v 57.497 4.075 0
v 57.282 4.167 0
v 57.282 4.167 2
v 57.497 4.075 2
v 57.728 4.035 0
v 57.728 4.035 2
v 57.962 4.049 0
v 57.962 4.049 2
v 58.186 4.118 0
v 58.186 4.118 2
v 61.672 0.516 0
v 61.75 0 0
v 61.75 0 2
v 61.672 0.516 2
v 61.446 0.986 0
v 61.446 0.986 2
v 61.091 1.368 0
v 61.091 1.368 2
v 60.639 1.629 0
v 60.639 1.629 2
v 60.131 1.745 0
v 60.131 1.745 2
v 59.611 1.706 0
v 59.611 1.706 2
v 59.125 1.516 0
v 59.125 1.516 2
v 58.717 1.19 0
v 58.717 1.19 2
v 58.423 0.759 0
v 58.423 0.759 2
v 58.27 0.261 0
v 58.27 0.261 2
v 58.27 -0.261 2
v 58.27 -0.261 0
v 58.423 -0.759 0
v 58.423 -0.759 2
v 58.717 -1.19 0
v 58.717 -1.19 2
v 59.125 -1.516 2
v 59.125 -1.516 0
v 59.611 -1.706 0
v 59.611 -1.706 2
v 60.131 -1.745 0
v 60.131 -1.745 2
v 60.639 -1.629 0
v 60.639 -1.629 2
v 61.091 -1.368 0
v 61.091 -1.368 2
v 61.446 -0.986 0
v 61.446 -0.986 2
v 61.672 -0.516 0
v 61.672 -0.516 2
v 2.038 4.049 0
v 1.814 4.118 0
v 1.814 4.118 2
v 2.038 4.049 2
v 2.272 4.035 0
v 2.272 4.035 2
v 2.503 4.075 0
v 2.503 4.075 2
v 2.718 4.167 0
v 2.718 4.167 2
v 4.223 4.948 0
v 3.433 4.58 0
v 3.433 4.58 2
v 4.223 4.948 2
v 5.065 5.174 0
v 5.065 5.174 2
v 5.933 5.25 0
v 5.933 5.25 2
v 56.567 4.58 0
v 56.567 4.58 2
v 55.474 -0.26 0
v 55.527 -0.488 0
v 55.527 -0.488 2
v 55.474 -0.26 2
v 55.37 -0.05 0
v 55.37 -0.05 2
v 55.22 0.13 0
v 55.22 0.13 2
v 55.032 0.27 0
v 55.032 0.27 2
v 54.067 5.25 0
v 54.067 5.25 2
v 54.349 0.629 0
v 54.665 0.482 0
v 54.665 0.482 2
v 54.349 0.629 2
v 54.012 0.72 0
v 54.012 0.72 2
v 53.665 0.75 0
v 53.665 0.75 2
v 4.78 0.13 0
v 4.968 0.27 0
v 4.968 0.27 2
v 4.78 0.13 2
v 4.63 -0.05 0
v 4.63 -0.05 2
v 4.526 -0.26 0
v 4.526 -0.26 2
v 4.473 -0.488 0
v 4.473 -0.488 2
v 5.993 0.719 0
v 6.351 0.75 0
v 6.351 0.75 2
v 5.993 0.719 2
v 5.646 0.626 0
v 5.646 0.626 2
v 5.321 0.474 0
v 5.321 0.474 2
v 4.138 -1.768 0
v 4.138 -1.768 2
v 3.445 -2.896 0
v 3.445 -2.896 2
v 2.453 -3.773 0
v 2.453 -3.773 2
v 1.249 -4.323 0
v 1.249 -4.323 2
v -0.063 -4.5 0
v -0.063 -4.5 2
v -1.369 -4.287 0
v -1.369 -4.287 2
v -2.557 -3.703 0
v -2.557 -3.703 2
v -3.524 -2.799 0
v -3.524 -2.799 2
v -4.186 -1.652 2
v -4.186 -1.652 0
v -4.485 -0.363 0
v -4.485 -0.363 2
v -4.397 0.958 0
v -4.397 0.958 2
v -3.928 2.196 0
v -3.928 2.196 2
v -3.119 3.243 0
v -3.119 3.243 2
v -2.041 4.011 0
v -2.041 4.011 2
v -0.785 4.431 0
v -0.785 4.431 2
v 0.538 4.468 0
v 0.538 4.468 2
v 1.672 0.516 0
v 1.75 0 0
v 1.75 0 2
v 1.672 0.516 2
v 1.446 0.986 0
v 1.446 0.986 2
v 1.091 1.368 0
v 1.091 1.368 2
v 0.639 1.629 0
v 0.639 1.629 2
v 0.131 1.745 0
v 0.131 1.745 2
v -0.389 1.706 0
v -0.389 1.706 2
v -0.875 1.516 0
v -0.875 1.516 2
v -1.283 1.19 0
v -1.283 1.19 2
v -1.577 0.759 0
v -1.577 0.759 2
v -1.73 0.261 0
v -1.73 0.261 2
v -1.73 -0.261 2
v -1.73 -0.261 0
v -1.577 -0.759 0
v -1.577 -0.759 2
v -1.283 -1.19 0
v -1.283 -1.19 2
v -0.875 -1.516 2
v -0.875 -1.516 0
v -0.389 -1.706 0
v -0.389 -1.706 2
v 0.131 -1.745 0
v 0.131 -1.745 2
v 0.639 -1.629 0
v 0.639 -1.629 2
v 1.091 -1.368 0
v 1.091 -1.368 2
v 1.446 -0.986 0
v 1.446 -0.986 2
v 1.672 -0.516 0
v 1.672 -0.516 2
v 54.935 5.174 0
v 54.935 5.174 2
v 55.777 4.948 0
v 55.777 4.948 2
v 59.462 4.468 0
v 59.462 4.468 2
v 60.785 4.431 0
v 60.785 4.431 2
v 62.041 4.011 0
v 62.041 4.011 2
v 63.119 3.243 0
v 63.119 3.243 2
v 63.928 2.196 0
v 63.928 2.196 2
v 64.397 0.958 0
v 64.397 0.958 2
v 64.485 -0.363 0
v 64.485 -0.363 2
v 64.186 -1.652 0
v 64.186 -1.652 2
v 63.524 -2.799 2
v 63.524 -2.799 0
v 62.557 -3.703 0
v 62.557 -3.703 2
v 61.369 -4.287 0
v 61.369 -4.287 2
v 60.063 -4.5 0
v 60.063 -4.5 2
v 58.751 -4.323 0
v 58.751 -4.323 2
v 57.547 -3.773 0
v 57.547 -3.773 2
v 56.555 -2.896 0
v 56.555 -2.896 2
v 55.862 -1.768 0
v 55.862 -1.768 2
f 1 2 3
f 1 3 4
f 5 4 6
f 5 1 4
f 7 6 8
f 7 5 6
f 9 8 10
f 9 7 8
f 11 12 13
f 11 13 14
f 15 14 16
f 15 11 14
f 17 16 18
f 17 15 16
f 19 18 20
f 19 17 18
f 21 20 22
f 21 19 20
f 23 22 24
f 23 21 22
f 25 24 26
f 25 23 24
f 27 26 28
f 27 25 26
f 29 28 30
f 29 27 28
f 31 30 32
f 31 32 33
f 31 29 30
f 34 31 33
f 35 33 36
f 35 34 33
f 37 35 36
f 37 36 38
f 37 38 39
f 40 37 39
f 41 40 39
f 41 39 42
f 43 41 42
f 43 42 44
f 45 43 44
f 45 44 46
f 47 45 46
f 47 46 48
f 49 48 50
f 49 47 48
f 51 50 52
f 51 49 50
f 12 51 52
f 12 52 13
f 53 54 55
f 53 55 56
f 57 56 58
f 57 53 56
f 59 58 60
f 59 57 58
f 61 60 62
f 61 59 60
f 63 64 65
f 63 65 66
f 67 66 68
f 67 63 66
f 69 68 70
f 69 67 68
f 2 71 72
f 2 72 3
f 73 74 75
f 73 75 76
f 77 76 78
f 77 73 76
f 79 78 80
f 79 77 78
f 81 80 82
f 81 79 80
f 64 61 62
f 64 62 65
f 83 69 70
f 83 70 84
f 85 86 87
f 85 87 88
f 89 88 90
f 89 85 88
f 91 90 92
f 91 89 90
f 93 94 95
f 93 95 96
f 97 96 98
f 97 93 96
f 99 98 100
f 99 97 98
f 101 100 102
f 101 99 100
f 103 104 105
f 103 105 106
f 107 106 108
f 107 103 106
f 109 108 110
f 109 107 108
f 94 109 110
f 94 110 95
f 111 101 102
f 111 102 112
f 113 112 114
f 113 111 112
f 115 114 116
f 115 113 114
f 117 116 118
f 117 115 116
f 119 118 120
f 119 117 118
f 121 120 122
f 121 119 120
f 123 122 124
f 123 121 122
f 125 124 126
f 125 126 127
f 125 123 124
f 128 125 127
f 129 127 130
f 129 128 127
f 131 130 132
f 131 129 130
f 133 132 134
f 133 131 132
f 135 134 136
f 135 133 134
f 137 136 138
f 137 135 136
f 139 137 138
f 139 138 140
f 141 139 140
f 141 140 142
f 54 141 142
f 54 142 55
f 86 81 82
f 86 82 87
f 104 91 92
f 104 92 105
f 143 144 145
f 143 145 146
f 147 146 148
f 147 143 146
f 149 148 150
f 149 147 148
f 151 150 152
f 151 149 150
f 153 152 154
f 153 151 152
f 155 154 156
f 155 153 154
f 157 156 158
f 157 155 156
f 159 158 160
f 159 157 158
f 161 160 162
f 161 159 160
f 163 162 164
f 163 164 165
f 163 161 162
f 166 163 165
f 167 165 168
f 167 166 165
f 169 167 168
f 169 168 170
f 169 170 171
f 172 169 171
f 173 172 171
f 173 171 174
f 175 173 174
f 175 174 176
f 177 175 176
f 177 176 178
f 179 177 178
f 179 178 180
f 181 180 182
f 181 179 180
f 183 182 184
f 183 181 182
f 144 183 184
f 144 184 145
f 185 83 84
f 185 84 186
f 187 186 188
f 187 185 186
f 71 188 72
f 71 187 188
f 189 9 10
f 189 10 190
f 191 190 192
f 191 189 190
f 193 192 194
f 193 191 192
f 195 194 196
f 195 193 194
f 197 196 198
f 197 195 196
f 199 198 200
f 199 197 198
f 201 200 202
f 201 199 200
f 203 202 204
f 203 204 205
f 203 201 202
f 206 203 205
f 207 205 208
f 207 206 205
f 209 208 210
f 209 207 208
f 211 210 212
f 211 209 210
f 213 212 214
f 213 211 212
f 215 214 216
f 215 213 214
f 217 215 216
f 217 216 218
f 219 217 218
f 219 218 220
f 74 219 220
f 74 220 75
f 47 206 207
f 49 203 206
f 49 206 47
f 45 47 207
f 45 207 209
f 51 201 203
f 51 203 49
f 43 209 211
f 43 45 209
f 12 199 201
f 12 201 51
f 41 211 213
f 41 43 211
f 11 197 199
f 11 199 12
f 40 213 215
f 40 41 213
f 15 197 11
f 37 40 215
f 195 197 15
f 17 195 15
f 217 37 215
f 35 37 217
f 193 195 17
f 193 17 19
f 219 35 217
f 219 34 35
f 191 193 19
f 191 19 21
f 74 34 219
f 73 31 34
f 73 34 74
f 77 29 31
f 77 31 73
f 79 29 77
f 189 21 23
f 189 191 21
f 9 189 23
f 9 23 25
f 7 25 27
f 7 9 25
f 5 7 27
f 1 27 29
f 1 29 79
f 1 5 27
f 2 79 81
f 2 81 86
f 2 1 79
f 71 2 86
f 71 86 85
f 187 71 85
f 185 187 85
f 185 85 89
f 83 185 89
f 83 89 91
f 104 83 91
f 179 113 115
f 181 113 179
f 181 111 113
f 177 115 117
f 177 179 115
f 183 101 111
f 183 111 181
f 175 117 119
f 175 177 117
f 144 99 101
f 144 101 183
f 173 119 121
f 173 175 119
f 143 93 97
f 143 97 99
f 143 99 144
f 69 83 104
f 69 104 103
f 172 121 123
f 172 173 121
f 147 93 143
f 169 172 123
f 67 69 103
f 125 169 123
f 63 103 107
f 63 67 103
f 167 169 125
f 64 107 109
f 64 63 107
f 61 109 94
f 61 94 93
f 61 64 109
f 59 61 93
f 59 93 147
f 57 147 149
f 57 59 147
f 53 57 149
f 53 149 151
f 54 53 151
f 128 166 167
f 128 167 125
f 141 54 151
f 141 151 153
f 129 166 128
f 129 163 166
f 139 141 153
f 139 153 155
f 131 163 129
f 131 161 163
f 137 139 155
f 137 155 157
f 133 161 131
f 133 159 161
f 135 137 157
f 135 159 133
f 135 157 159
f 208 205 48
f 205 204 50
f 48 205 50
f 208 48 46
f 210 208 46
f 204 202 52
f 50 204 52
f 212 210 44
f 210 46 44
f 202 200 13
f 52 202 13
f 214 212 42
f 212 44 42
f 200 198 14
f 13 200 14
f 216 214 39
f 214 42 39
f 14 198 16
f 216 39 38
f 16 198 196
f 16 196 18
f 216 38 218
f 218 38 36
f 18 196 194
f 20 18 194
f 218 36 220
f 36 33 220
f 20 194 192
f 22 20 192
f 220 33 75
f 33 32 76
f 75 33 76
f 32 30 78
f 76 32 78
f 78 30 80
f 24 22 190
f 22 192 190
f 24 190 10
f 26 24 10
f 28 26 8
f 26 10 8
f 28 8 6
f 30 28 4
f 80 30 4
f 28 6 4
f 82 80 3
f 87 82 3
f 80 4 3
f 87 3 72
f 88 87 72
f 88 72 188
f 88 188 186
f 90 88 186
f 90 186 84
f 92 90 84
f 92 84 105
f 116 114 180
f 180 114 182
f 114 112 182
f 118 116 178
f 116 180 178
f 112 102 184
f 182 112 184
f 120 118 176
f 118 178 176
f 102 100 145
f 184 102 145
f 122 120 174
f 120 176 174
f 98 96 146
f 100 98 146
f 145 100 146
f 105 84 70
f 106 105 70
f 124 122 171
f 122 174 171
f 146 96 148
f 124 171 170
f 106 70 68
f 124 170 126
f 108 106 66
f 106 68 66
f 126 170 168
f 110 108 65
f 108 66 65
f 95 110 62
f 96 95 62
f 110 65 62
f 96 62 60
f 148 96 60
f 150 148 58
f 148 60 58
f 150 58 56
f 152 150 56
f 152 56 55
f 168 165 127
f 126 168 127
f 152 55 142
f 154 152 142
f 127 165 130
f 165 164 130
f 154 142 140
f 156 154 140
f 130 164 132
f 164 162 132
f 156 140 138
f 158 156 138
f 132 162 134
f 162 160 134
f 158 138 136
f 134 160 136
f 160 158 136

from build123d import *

# Parameters (mm, degrees)
SKETCH1_R           = 1.75
BOSS_EXTRUDE1_DEPTH = 2


with BuildPart() as part:
    # Sketch1 → Boss-Extrude1 (new body)
    with BuildSketch(Plane.XY):
        with BuildLine():
            Line((2.717606537, 4.167087077), (3.433012702, 4.580127019))
            ThreePointArc((3.433012702, 4.580127019), (4.638917476, 5.079629131), (5.933012702, 5.25))
            Line((5.933012702, 5.25), (54.066987298, 5.25))
            ThreePointArc((54.066987298, 5.25), (55.361082524, 5.079629131), (56.566987298, 4.580127019))
            Line((56.566987298, 4.580127019), (57.282393463, 4.167087077))
            ThreePointArc((57.282393463, 4.167087077), (57.728126896, 4.034585997), (58.185594651, 4.118001121))
            ThreePointArc((58.185594651, 4.118001121), (63.897114317, -2.25), (55.526503742, -0.487679436))
            ThreePointArc((55.526503742, -0.487679436), (55.370009481, -0.049793176), (55.032393463, 0.26997276))
            Line((55.032393463, 0.26997276), (54.665063509, 0.482050808))
            ThreePointArc((54.665063509, 0.482050808), (54.1827016, 0.681851653), (53.665063509, 0.75))
            Line((53.665063509, 0.75), (6.350969201, 0.75))
            ThreePointArc((6.350969201, 0.75), (5.817844702, 0.679812828), (5.321051756, 0.474034452))
            Line((5.321051756, 0.474034452), (4.967606537, 0.26997276))
            ThreePointArc((4.967606537, 0.26997276), (4.629990519, -0.049793176), (4.473496258, -0.487679436))
            ThreePointArc((4.473496258, -0.487679436), (-3.897114317, -2.25), (1.814405349, 4.118001121))
            ThreePointArc((1.814405349, 4.118001121), (2.271873104, 4.034585997), (2.717606537, 4.167087077))
        make_face()
        Circle(SKETCH1_R, mode=Mode.SUBTRACT)
        with Locations((60, 0)):
            Circle(SKETCH1_R, mode=Mode.SUBTRACT)
    extrude(amount=BOSS_EXTRUDE1_DEPTH)


solid = part.part
